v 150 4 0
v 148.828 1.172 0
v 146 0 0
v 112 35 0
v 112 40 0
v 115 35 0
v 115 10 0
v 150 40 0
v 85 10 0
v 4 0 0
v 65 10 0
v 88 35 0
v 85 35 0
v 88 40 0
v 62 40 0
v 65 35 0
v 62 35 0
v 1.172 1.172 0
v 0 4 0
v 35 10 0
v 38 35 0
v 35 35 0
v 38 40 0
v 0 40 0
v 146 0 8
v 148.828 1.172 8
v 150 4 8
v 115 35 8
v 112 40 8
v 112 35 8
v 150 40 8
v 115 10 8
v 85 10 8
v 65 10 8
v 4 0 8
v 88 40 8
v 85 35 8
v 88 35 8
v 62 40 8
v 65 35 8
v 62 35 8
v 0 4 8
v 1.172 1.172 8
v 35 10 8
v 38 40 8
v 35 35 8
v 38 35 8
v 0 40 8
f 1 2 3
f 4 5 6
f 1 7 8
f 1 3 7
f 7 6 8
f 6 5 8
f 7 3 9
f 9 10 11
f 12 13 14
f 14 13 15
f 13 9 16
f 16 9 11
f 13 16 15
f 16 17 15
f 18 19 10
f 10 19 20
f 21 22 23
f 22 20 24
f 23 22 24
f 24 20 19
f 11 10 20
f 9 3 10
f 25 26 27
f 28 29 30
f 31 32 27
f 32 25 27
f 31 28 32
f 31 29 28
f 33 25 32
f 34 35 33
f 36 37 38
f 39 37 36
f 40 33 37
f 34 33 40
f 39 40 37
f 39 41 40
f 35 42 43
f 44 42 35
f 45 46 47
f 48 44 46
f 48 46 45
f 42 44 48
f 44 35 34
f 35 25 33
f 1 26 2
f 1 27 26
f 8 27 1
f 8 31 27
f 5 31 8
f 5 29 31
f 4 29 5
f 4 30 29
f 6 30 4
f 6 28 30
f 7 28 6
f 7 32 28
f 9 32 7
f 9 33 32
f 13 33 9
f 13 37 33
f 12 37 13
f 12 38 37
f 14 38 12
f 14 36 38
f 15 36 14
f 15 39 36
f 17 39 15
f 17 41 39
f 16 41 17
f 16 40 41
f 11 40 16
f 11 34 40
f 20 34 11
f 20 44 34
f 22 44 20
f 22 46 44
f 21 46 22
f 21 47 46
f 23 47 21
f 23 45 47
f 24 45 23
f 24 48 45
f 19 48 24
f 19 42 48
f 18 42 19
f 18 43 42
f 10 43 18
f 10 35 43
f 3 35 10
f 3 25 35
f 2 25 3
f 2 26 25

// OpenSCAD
$fn = 32;

// ----------------------------------------------------------------------
// Oversize slot bar: 150 mm bar with 2 oversize windows
// ----------------------------------------------------------------------

// --- parameters (mm) ---
profile_height = 8;       // extrusion height
profile_points = 24;      // points of the closed outline

profile = [[0, 4], [1.172, 1.172], [4, 0], [146, 0], [148.828, 1.172], [150, 4], [150, 40], [112, 40], [112, 35], [115, 35], [115, 10], [85, 10], [85, 35], [88, 35], [88, 40], [62, 40], [62, 35], [65, 35], [65, 10], [35, 10], [35, 35], [38, 35], [38, 40], [0, 40]];  // single closed polygon, 24 points, counter clockwise

// --- the one profile operation ---
linear_extrude(height = profile_height) polygon(points = profile);
